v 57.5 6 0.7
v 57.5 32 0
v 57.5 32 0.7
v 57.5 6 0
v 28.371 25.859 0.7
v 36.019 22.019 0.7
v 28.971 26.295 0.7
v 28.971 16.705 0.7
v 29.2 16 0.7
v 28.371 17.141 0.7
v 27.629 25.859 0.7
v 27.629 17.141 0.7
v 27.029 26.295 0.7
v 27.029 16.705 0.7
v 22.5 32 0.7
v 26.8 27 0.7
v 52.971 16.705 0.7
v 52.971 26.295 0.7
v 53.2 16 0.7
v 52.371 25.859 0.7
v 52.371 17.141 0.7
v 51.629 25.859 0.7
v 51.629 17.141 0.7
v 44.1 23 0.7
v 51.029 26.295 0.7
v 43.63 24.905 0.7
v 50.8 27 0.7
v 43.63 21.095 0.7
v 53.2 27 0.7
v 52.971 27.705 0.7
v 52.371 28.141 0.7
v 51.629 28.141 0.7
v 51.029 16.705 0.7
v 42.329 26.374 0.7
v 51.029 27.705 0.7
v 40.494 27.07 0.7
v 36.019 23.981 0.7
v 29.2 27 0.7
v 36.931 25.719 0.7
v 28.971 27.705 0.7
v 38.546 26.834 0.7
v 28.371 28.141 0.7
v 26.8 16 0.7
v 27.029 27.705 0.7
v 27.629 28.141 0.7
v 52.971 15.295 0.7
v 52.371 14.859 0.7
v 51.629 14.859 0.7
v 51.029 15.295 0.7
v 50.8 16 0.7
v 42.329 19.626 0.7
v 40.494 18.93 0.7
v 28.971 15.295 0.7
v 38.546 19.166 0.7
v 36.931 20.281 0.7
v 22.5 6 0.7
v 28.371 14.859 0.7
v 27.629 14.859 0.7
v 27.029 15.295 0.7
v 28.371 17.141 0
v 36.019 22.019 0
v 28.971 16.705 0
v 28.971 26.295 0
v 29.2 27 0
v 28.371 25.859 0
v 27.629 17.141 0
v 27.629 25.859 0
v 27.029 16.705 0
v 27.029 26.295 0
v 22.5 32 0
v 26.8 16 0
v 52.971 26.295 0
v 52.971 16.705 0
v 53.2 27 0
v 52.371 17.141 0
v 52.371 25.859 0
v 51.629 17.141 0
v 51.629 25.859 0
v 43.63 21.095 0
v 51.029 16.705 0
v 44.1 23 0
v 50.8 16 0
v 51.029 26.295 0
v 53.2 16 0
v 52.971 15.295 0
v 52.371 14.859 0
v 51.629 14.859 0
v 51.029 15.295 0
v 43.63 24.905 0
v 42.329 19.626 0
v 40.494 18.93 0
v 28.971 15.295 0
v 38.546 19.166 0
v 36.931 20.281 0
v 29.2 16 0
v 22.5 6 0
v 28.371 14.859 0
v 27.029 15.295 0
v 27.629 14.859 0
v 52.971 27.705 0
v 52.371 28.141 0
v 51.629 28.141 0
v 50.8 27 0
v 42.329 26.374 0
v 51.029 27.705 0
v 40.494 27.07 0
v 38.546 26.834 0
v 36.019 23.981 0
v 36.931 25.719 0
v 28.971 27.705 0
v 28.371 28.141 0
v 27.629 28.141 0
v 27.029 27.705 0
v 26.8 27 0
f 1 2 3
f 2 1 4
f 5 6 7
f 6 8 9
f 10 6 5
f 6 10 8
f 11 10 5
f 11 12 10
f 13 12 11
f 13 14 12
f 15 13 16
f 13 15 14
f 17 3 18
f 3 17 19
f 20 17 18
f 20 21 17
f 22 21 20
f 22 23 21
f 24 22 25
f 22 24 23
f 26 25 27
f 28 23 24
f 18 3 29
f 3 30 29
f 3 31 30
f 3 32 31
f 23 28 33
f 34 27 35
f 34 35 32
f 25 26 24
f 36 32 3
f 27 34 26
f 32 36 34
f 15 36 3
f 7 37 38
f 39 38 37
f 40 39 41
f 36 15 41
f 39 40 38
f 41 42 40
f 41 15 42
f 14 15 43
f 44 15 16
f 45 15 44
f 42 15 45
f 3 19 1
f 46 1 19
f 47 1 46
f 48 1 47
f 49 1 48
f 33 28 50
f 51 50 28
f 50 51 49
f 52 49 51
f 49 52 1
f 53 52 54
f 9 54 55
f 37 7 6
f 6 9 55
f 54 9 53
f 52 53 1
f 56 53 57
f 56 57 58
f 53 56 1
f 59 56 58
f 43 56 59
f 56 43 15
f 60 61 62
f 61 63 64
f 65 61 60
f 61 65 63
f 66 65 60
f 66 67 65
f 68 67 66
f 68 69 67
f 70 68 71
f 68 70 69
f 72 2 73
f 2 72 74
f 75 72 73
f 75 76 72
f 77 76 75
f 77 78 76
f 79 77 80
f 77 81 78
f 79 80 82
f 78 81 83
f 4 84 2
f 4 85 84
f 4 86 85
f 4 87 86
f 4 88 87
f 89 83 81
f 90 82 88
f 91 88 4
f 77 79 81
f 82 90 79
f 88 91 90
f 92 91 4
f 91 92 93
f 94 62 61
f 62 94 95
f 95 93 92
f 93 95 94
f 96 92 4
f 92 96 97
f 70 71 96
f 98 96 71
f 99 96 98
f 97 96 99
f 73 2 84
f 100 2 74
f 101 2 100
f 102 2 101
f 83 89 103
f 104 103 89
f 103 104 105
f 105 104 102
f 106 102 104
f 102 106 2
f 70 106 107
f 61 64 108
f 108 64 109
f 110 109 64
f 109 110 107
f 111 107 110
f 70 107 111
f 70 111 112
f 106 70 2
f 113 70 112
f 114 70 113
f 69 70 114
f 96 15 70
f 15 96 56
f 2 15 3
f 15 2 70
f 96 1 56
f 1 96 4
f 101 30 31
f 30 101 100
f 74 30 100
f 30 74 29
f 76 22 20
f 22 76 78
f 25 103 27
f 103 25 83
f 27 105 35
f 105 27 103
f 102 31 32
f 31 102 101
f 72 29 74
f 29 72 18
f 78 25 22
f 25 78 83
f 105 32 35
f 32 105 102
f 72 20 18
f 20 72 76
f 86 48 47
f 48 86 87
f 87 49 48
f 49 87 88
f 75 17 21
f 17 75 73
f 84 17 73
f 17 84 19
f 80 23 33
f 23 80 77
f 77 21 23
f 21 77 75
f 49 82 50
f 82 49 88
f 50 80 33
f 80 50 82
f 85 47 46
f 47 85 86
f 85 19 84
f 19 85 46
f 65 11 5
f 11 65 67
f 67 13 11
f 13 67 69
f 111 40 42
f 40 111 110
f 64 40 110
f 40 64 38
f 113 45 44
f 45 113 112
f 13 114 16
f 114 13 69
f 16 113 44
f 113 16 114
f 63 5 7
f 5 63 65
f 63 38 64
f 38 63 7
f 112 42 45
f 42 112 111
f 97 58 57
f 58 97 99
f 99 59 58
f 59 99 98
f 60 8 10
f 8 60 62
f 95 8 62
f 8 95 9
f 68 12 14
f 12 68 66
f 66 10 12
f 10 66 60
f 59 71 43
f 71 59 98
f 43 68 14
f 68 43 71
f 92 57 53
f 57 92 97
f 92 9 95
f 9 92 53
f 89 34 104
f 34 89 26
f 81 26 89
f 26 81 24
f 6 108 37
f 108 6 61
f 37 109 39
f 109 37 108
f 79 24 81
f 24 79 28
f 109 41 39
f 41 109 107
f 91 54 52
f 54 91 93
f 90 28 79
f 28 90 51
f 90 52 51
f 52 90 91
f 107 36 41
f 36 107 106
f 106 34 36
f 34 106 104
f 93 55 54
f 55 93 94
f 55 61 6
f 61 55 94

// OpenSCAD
union(){

/*difference(){
	union(){
		translate([-36/2,0,0])cube([36,31,4]);
		translate([-35/2,0,0])cube([35,5,10]);
	}		
	translate([-19/2,-2,1.5])cube([19,40,6]);
	translate([23,5.1,-1])rotate([0,-60,0])cube(40);
	mirror([1,0,0])translate([23,5.1,-1])rotate([0,-60,0])cube(40);
	translate([0,14,-1])cylinder(r=8,h=5);
	translate([0,6,-1])cube([30,6,6]);
	translate([12,27,-1])cylinder(r=1.2,h=10, $fn=10);
	translate([12,16,-1])cylinder(r=1.2,h=10, $fn=10);
	translate([-12,27,-1])cylinder(r=1.2,h=10, $fn=10);
	translate([-12,16,-1])cylinder(r=1.2,h=10, $fn=10);
}*/

difference(){
	translate([-15+40-2.5,12-6,0])cube([30+5,20+6,0.7]);
	translate([12+40,27,-1])cylinder(r=1.2,h=10, $fn=10);
	translate([12+40,16,-1])cylinder(r=1.2,h=10, $fn=10);
	translate([-12+40,27,-1])cylinder(r=1.2,h=10, $fn=10);
	translate([-12+40,16,-1])cylinder(r=1.2,h=10, $fn=10);
	translate([40,23,-1])cylinder(r=4.1,h=10);

}

}
